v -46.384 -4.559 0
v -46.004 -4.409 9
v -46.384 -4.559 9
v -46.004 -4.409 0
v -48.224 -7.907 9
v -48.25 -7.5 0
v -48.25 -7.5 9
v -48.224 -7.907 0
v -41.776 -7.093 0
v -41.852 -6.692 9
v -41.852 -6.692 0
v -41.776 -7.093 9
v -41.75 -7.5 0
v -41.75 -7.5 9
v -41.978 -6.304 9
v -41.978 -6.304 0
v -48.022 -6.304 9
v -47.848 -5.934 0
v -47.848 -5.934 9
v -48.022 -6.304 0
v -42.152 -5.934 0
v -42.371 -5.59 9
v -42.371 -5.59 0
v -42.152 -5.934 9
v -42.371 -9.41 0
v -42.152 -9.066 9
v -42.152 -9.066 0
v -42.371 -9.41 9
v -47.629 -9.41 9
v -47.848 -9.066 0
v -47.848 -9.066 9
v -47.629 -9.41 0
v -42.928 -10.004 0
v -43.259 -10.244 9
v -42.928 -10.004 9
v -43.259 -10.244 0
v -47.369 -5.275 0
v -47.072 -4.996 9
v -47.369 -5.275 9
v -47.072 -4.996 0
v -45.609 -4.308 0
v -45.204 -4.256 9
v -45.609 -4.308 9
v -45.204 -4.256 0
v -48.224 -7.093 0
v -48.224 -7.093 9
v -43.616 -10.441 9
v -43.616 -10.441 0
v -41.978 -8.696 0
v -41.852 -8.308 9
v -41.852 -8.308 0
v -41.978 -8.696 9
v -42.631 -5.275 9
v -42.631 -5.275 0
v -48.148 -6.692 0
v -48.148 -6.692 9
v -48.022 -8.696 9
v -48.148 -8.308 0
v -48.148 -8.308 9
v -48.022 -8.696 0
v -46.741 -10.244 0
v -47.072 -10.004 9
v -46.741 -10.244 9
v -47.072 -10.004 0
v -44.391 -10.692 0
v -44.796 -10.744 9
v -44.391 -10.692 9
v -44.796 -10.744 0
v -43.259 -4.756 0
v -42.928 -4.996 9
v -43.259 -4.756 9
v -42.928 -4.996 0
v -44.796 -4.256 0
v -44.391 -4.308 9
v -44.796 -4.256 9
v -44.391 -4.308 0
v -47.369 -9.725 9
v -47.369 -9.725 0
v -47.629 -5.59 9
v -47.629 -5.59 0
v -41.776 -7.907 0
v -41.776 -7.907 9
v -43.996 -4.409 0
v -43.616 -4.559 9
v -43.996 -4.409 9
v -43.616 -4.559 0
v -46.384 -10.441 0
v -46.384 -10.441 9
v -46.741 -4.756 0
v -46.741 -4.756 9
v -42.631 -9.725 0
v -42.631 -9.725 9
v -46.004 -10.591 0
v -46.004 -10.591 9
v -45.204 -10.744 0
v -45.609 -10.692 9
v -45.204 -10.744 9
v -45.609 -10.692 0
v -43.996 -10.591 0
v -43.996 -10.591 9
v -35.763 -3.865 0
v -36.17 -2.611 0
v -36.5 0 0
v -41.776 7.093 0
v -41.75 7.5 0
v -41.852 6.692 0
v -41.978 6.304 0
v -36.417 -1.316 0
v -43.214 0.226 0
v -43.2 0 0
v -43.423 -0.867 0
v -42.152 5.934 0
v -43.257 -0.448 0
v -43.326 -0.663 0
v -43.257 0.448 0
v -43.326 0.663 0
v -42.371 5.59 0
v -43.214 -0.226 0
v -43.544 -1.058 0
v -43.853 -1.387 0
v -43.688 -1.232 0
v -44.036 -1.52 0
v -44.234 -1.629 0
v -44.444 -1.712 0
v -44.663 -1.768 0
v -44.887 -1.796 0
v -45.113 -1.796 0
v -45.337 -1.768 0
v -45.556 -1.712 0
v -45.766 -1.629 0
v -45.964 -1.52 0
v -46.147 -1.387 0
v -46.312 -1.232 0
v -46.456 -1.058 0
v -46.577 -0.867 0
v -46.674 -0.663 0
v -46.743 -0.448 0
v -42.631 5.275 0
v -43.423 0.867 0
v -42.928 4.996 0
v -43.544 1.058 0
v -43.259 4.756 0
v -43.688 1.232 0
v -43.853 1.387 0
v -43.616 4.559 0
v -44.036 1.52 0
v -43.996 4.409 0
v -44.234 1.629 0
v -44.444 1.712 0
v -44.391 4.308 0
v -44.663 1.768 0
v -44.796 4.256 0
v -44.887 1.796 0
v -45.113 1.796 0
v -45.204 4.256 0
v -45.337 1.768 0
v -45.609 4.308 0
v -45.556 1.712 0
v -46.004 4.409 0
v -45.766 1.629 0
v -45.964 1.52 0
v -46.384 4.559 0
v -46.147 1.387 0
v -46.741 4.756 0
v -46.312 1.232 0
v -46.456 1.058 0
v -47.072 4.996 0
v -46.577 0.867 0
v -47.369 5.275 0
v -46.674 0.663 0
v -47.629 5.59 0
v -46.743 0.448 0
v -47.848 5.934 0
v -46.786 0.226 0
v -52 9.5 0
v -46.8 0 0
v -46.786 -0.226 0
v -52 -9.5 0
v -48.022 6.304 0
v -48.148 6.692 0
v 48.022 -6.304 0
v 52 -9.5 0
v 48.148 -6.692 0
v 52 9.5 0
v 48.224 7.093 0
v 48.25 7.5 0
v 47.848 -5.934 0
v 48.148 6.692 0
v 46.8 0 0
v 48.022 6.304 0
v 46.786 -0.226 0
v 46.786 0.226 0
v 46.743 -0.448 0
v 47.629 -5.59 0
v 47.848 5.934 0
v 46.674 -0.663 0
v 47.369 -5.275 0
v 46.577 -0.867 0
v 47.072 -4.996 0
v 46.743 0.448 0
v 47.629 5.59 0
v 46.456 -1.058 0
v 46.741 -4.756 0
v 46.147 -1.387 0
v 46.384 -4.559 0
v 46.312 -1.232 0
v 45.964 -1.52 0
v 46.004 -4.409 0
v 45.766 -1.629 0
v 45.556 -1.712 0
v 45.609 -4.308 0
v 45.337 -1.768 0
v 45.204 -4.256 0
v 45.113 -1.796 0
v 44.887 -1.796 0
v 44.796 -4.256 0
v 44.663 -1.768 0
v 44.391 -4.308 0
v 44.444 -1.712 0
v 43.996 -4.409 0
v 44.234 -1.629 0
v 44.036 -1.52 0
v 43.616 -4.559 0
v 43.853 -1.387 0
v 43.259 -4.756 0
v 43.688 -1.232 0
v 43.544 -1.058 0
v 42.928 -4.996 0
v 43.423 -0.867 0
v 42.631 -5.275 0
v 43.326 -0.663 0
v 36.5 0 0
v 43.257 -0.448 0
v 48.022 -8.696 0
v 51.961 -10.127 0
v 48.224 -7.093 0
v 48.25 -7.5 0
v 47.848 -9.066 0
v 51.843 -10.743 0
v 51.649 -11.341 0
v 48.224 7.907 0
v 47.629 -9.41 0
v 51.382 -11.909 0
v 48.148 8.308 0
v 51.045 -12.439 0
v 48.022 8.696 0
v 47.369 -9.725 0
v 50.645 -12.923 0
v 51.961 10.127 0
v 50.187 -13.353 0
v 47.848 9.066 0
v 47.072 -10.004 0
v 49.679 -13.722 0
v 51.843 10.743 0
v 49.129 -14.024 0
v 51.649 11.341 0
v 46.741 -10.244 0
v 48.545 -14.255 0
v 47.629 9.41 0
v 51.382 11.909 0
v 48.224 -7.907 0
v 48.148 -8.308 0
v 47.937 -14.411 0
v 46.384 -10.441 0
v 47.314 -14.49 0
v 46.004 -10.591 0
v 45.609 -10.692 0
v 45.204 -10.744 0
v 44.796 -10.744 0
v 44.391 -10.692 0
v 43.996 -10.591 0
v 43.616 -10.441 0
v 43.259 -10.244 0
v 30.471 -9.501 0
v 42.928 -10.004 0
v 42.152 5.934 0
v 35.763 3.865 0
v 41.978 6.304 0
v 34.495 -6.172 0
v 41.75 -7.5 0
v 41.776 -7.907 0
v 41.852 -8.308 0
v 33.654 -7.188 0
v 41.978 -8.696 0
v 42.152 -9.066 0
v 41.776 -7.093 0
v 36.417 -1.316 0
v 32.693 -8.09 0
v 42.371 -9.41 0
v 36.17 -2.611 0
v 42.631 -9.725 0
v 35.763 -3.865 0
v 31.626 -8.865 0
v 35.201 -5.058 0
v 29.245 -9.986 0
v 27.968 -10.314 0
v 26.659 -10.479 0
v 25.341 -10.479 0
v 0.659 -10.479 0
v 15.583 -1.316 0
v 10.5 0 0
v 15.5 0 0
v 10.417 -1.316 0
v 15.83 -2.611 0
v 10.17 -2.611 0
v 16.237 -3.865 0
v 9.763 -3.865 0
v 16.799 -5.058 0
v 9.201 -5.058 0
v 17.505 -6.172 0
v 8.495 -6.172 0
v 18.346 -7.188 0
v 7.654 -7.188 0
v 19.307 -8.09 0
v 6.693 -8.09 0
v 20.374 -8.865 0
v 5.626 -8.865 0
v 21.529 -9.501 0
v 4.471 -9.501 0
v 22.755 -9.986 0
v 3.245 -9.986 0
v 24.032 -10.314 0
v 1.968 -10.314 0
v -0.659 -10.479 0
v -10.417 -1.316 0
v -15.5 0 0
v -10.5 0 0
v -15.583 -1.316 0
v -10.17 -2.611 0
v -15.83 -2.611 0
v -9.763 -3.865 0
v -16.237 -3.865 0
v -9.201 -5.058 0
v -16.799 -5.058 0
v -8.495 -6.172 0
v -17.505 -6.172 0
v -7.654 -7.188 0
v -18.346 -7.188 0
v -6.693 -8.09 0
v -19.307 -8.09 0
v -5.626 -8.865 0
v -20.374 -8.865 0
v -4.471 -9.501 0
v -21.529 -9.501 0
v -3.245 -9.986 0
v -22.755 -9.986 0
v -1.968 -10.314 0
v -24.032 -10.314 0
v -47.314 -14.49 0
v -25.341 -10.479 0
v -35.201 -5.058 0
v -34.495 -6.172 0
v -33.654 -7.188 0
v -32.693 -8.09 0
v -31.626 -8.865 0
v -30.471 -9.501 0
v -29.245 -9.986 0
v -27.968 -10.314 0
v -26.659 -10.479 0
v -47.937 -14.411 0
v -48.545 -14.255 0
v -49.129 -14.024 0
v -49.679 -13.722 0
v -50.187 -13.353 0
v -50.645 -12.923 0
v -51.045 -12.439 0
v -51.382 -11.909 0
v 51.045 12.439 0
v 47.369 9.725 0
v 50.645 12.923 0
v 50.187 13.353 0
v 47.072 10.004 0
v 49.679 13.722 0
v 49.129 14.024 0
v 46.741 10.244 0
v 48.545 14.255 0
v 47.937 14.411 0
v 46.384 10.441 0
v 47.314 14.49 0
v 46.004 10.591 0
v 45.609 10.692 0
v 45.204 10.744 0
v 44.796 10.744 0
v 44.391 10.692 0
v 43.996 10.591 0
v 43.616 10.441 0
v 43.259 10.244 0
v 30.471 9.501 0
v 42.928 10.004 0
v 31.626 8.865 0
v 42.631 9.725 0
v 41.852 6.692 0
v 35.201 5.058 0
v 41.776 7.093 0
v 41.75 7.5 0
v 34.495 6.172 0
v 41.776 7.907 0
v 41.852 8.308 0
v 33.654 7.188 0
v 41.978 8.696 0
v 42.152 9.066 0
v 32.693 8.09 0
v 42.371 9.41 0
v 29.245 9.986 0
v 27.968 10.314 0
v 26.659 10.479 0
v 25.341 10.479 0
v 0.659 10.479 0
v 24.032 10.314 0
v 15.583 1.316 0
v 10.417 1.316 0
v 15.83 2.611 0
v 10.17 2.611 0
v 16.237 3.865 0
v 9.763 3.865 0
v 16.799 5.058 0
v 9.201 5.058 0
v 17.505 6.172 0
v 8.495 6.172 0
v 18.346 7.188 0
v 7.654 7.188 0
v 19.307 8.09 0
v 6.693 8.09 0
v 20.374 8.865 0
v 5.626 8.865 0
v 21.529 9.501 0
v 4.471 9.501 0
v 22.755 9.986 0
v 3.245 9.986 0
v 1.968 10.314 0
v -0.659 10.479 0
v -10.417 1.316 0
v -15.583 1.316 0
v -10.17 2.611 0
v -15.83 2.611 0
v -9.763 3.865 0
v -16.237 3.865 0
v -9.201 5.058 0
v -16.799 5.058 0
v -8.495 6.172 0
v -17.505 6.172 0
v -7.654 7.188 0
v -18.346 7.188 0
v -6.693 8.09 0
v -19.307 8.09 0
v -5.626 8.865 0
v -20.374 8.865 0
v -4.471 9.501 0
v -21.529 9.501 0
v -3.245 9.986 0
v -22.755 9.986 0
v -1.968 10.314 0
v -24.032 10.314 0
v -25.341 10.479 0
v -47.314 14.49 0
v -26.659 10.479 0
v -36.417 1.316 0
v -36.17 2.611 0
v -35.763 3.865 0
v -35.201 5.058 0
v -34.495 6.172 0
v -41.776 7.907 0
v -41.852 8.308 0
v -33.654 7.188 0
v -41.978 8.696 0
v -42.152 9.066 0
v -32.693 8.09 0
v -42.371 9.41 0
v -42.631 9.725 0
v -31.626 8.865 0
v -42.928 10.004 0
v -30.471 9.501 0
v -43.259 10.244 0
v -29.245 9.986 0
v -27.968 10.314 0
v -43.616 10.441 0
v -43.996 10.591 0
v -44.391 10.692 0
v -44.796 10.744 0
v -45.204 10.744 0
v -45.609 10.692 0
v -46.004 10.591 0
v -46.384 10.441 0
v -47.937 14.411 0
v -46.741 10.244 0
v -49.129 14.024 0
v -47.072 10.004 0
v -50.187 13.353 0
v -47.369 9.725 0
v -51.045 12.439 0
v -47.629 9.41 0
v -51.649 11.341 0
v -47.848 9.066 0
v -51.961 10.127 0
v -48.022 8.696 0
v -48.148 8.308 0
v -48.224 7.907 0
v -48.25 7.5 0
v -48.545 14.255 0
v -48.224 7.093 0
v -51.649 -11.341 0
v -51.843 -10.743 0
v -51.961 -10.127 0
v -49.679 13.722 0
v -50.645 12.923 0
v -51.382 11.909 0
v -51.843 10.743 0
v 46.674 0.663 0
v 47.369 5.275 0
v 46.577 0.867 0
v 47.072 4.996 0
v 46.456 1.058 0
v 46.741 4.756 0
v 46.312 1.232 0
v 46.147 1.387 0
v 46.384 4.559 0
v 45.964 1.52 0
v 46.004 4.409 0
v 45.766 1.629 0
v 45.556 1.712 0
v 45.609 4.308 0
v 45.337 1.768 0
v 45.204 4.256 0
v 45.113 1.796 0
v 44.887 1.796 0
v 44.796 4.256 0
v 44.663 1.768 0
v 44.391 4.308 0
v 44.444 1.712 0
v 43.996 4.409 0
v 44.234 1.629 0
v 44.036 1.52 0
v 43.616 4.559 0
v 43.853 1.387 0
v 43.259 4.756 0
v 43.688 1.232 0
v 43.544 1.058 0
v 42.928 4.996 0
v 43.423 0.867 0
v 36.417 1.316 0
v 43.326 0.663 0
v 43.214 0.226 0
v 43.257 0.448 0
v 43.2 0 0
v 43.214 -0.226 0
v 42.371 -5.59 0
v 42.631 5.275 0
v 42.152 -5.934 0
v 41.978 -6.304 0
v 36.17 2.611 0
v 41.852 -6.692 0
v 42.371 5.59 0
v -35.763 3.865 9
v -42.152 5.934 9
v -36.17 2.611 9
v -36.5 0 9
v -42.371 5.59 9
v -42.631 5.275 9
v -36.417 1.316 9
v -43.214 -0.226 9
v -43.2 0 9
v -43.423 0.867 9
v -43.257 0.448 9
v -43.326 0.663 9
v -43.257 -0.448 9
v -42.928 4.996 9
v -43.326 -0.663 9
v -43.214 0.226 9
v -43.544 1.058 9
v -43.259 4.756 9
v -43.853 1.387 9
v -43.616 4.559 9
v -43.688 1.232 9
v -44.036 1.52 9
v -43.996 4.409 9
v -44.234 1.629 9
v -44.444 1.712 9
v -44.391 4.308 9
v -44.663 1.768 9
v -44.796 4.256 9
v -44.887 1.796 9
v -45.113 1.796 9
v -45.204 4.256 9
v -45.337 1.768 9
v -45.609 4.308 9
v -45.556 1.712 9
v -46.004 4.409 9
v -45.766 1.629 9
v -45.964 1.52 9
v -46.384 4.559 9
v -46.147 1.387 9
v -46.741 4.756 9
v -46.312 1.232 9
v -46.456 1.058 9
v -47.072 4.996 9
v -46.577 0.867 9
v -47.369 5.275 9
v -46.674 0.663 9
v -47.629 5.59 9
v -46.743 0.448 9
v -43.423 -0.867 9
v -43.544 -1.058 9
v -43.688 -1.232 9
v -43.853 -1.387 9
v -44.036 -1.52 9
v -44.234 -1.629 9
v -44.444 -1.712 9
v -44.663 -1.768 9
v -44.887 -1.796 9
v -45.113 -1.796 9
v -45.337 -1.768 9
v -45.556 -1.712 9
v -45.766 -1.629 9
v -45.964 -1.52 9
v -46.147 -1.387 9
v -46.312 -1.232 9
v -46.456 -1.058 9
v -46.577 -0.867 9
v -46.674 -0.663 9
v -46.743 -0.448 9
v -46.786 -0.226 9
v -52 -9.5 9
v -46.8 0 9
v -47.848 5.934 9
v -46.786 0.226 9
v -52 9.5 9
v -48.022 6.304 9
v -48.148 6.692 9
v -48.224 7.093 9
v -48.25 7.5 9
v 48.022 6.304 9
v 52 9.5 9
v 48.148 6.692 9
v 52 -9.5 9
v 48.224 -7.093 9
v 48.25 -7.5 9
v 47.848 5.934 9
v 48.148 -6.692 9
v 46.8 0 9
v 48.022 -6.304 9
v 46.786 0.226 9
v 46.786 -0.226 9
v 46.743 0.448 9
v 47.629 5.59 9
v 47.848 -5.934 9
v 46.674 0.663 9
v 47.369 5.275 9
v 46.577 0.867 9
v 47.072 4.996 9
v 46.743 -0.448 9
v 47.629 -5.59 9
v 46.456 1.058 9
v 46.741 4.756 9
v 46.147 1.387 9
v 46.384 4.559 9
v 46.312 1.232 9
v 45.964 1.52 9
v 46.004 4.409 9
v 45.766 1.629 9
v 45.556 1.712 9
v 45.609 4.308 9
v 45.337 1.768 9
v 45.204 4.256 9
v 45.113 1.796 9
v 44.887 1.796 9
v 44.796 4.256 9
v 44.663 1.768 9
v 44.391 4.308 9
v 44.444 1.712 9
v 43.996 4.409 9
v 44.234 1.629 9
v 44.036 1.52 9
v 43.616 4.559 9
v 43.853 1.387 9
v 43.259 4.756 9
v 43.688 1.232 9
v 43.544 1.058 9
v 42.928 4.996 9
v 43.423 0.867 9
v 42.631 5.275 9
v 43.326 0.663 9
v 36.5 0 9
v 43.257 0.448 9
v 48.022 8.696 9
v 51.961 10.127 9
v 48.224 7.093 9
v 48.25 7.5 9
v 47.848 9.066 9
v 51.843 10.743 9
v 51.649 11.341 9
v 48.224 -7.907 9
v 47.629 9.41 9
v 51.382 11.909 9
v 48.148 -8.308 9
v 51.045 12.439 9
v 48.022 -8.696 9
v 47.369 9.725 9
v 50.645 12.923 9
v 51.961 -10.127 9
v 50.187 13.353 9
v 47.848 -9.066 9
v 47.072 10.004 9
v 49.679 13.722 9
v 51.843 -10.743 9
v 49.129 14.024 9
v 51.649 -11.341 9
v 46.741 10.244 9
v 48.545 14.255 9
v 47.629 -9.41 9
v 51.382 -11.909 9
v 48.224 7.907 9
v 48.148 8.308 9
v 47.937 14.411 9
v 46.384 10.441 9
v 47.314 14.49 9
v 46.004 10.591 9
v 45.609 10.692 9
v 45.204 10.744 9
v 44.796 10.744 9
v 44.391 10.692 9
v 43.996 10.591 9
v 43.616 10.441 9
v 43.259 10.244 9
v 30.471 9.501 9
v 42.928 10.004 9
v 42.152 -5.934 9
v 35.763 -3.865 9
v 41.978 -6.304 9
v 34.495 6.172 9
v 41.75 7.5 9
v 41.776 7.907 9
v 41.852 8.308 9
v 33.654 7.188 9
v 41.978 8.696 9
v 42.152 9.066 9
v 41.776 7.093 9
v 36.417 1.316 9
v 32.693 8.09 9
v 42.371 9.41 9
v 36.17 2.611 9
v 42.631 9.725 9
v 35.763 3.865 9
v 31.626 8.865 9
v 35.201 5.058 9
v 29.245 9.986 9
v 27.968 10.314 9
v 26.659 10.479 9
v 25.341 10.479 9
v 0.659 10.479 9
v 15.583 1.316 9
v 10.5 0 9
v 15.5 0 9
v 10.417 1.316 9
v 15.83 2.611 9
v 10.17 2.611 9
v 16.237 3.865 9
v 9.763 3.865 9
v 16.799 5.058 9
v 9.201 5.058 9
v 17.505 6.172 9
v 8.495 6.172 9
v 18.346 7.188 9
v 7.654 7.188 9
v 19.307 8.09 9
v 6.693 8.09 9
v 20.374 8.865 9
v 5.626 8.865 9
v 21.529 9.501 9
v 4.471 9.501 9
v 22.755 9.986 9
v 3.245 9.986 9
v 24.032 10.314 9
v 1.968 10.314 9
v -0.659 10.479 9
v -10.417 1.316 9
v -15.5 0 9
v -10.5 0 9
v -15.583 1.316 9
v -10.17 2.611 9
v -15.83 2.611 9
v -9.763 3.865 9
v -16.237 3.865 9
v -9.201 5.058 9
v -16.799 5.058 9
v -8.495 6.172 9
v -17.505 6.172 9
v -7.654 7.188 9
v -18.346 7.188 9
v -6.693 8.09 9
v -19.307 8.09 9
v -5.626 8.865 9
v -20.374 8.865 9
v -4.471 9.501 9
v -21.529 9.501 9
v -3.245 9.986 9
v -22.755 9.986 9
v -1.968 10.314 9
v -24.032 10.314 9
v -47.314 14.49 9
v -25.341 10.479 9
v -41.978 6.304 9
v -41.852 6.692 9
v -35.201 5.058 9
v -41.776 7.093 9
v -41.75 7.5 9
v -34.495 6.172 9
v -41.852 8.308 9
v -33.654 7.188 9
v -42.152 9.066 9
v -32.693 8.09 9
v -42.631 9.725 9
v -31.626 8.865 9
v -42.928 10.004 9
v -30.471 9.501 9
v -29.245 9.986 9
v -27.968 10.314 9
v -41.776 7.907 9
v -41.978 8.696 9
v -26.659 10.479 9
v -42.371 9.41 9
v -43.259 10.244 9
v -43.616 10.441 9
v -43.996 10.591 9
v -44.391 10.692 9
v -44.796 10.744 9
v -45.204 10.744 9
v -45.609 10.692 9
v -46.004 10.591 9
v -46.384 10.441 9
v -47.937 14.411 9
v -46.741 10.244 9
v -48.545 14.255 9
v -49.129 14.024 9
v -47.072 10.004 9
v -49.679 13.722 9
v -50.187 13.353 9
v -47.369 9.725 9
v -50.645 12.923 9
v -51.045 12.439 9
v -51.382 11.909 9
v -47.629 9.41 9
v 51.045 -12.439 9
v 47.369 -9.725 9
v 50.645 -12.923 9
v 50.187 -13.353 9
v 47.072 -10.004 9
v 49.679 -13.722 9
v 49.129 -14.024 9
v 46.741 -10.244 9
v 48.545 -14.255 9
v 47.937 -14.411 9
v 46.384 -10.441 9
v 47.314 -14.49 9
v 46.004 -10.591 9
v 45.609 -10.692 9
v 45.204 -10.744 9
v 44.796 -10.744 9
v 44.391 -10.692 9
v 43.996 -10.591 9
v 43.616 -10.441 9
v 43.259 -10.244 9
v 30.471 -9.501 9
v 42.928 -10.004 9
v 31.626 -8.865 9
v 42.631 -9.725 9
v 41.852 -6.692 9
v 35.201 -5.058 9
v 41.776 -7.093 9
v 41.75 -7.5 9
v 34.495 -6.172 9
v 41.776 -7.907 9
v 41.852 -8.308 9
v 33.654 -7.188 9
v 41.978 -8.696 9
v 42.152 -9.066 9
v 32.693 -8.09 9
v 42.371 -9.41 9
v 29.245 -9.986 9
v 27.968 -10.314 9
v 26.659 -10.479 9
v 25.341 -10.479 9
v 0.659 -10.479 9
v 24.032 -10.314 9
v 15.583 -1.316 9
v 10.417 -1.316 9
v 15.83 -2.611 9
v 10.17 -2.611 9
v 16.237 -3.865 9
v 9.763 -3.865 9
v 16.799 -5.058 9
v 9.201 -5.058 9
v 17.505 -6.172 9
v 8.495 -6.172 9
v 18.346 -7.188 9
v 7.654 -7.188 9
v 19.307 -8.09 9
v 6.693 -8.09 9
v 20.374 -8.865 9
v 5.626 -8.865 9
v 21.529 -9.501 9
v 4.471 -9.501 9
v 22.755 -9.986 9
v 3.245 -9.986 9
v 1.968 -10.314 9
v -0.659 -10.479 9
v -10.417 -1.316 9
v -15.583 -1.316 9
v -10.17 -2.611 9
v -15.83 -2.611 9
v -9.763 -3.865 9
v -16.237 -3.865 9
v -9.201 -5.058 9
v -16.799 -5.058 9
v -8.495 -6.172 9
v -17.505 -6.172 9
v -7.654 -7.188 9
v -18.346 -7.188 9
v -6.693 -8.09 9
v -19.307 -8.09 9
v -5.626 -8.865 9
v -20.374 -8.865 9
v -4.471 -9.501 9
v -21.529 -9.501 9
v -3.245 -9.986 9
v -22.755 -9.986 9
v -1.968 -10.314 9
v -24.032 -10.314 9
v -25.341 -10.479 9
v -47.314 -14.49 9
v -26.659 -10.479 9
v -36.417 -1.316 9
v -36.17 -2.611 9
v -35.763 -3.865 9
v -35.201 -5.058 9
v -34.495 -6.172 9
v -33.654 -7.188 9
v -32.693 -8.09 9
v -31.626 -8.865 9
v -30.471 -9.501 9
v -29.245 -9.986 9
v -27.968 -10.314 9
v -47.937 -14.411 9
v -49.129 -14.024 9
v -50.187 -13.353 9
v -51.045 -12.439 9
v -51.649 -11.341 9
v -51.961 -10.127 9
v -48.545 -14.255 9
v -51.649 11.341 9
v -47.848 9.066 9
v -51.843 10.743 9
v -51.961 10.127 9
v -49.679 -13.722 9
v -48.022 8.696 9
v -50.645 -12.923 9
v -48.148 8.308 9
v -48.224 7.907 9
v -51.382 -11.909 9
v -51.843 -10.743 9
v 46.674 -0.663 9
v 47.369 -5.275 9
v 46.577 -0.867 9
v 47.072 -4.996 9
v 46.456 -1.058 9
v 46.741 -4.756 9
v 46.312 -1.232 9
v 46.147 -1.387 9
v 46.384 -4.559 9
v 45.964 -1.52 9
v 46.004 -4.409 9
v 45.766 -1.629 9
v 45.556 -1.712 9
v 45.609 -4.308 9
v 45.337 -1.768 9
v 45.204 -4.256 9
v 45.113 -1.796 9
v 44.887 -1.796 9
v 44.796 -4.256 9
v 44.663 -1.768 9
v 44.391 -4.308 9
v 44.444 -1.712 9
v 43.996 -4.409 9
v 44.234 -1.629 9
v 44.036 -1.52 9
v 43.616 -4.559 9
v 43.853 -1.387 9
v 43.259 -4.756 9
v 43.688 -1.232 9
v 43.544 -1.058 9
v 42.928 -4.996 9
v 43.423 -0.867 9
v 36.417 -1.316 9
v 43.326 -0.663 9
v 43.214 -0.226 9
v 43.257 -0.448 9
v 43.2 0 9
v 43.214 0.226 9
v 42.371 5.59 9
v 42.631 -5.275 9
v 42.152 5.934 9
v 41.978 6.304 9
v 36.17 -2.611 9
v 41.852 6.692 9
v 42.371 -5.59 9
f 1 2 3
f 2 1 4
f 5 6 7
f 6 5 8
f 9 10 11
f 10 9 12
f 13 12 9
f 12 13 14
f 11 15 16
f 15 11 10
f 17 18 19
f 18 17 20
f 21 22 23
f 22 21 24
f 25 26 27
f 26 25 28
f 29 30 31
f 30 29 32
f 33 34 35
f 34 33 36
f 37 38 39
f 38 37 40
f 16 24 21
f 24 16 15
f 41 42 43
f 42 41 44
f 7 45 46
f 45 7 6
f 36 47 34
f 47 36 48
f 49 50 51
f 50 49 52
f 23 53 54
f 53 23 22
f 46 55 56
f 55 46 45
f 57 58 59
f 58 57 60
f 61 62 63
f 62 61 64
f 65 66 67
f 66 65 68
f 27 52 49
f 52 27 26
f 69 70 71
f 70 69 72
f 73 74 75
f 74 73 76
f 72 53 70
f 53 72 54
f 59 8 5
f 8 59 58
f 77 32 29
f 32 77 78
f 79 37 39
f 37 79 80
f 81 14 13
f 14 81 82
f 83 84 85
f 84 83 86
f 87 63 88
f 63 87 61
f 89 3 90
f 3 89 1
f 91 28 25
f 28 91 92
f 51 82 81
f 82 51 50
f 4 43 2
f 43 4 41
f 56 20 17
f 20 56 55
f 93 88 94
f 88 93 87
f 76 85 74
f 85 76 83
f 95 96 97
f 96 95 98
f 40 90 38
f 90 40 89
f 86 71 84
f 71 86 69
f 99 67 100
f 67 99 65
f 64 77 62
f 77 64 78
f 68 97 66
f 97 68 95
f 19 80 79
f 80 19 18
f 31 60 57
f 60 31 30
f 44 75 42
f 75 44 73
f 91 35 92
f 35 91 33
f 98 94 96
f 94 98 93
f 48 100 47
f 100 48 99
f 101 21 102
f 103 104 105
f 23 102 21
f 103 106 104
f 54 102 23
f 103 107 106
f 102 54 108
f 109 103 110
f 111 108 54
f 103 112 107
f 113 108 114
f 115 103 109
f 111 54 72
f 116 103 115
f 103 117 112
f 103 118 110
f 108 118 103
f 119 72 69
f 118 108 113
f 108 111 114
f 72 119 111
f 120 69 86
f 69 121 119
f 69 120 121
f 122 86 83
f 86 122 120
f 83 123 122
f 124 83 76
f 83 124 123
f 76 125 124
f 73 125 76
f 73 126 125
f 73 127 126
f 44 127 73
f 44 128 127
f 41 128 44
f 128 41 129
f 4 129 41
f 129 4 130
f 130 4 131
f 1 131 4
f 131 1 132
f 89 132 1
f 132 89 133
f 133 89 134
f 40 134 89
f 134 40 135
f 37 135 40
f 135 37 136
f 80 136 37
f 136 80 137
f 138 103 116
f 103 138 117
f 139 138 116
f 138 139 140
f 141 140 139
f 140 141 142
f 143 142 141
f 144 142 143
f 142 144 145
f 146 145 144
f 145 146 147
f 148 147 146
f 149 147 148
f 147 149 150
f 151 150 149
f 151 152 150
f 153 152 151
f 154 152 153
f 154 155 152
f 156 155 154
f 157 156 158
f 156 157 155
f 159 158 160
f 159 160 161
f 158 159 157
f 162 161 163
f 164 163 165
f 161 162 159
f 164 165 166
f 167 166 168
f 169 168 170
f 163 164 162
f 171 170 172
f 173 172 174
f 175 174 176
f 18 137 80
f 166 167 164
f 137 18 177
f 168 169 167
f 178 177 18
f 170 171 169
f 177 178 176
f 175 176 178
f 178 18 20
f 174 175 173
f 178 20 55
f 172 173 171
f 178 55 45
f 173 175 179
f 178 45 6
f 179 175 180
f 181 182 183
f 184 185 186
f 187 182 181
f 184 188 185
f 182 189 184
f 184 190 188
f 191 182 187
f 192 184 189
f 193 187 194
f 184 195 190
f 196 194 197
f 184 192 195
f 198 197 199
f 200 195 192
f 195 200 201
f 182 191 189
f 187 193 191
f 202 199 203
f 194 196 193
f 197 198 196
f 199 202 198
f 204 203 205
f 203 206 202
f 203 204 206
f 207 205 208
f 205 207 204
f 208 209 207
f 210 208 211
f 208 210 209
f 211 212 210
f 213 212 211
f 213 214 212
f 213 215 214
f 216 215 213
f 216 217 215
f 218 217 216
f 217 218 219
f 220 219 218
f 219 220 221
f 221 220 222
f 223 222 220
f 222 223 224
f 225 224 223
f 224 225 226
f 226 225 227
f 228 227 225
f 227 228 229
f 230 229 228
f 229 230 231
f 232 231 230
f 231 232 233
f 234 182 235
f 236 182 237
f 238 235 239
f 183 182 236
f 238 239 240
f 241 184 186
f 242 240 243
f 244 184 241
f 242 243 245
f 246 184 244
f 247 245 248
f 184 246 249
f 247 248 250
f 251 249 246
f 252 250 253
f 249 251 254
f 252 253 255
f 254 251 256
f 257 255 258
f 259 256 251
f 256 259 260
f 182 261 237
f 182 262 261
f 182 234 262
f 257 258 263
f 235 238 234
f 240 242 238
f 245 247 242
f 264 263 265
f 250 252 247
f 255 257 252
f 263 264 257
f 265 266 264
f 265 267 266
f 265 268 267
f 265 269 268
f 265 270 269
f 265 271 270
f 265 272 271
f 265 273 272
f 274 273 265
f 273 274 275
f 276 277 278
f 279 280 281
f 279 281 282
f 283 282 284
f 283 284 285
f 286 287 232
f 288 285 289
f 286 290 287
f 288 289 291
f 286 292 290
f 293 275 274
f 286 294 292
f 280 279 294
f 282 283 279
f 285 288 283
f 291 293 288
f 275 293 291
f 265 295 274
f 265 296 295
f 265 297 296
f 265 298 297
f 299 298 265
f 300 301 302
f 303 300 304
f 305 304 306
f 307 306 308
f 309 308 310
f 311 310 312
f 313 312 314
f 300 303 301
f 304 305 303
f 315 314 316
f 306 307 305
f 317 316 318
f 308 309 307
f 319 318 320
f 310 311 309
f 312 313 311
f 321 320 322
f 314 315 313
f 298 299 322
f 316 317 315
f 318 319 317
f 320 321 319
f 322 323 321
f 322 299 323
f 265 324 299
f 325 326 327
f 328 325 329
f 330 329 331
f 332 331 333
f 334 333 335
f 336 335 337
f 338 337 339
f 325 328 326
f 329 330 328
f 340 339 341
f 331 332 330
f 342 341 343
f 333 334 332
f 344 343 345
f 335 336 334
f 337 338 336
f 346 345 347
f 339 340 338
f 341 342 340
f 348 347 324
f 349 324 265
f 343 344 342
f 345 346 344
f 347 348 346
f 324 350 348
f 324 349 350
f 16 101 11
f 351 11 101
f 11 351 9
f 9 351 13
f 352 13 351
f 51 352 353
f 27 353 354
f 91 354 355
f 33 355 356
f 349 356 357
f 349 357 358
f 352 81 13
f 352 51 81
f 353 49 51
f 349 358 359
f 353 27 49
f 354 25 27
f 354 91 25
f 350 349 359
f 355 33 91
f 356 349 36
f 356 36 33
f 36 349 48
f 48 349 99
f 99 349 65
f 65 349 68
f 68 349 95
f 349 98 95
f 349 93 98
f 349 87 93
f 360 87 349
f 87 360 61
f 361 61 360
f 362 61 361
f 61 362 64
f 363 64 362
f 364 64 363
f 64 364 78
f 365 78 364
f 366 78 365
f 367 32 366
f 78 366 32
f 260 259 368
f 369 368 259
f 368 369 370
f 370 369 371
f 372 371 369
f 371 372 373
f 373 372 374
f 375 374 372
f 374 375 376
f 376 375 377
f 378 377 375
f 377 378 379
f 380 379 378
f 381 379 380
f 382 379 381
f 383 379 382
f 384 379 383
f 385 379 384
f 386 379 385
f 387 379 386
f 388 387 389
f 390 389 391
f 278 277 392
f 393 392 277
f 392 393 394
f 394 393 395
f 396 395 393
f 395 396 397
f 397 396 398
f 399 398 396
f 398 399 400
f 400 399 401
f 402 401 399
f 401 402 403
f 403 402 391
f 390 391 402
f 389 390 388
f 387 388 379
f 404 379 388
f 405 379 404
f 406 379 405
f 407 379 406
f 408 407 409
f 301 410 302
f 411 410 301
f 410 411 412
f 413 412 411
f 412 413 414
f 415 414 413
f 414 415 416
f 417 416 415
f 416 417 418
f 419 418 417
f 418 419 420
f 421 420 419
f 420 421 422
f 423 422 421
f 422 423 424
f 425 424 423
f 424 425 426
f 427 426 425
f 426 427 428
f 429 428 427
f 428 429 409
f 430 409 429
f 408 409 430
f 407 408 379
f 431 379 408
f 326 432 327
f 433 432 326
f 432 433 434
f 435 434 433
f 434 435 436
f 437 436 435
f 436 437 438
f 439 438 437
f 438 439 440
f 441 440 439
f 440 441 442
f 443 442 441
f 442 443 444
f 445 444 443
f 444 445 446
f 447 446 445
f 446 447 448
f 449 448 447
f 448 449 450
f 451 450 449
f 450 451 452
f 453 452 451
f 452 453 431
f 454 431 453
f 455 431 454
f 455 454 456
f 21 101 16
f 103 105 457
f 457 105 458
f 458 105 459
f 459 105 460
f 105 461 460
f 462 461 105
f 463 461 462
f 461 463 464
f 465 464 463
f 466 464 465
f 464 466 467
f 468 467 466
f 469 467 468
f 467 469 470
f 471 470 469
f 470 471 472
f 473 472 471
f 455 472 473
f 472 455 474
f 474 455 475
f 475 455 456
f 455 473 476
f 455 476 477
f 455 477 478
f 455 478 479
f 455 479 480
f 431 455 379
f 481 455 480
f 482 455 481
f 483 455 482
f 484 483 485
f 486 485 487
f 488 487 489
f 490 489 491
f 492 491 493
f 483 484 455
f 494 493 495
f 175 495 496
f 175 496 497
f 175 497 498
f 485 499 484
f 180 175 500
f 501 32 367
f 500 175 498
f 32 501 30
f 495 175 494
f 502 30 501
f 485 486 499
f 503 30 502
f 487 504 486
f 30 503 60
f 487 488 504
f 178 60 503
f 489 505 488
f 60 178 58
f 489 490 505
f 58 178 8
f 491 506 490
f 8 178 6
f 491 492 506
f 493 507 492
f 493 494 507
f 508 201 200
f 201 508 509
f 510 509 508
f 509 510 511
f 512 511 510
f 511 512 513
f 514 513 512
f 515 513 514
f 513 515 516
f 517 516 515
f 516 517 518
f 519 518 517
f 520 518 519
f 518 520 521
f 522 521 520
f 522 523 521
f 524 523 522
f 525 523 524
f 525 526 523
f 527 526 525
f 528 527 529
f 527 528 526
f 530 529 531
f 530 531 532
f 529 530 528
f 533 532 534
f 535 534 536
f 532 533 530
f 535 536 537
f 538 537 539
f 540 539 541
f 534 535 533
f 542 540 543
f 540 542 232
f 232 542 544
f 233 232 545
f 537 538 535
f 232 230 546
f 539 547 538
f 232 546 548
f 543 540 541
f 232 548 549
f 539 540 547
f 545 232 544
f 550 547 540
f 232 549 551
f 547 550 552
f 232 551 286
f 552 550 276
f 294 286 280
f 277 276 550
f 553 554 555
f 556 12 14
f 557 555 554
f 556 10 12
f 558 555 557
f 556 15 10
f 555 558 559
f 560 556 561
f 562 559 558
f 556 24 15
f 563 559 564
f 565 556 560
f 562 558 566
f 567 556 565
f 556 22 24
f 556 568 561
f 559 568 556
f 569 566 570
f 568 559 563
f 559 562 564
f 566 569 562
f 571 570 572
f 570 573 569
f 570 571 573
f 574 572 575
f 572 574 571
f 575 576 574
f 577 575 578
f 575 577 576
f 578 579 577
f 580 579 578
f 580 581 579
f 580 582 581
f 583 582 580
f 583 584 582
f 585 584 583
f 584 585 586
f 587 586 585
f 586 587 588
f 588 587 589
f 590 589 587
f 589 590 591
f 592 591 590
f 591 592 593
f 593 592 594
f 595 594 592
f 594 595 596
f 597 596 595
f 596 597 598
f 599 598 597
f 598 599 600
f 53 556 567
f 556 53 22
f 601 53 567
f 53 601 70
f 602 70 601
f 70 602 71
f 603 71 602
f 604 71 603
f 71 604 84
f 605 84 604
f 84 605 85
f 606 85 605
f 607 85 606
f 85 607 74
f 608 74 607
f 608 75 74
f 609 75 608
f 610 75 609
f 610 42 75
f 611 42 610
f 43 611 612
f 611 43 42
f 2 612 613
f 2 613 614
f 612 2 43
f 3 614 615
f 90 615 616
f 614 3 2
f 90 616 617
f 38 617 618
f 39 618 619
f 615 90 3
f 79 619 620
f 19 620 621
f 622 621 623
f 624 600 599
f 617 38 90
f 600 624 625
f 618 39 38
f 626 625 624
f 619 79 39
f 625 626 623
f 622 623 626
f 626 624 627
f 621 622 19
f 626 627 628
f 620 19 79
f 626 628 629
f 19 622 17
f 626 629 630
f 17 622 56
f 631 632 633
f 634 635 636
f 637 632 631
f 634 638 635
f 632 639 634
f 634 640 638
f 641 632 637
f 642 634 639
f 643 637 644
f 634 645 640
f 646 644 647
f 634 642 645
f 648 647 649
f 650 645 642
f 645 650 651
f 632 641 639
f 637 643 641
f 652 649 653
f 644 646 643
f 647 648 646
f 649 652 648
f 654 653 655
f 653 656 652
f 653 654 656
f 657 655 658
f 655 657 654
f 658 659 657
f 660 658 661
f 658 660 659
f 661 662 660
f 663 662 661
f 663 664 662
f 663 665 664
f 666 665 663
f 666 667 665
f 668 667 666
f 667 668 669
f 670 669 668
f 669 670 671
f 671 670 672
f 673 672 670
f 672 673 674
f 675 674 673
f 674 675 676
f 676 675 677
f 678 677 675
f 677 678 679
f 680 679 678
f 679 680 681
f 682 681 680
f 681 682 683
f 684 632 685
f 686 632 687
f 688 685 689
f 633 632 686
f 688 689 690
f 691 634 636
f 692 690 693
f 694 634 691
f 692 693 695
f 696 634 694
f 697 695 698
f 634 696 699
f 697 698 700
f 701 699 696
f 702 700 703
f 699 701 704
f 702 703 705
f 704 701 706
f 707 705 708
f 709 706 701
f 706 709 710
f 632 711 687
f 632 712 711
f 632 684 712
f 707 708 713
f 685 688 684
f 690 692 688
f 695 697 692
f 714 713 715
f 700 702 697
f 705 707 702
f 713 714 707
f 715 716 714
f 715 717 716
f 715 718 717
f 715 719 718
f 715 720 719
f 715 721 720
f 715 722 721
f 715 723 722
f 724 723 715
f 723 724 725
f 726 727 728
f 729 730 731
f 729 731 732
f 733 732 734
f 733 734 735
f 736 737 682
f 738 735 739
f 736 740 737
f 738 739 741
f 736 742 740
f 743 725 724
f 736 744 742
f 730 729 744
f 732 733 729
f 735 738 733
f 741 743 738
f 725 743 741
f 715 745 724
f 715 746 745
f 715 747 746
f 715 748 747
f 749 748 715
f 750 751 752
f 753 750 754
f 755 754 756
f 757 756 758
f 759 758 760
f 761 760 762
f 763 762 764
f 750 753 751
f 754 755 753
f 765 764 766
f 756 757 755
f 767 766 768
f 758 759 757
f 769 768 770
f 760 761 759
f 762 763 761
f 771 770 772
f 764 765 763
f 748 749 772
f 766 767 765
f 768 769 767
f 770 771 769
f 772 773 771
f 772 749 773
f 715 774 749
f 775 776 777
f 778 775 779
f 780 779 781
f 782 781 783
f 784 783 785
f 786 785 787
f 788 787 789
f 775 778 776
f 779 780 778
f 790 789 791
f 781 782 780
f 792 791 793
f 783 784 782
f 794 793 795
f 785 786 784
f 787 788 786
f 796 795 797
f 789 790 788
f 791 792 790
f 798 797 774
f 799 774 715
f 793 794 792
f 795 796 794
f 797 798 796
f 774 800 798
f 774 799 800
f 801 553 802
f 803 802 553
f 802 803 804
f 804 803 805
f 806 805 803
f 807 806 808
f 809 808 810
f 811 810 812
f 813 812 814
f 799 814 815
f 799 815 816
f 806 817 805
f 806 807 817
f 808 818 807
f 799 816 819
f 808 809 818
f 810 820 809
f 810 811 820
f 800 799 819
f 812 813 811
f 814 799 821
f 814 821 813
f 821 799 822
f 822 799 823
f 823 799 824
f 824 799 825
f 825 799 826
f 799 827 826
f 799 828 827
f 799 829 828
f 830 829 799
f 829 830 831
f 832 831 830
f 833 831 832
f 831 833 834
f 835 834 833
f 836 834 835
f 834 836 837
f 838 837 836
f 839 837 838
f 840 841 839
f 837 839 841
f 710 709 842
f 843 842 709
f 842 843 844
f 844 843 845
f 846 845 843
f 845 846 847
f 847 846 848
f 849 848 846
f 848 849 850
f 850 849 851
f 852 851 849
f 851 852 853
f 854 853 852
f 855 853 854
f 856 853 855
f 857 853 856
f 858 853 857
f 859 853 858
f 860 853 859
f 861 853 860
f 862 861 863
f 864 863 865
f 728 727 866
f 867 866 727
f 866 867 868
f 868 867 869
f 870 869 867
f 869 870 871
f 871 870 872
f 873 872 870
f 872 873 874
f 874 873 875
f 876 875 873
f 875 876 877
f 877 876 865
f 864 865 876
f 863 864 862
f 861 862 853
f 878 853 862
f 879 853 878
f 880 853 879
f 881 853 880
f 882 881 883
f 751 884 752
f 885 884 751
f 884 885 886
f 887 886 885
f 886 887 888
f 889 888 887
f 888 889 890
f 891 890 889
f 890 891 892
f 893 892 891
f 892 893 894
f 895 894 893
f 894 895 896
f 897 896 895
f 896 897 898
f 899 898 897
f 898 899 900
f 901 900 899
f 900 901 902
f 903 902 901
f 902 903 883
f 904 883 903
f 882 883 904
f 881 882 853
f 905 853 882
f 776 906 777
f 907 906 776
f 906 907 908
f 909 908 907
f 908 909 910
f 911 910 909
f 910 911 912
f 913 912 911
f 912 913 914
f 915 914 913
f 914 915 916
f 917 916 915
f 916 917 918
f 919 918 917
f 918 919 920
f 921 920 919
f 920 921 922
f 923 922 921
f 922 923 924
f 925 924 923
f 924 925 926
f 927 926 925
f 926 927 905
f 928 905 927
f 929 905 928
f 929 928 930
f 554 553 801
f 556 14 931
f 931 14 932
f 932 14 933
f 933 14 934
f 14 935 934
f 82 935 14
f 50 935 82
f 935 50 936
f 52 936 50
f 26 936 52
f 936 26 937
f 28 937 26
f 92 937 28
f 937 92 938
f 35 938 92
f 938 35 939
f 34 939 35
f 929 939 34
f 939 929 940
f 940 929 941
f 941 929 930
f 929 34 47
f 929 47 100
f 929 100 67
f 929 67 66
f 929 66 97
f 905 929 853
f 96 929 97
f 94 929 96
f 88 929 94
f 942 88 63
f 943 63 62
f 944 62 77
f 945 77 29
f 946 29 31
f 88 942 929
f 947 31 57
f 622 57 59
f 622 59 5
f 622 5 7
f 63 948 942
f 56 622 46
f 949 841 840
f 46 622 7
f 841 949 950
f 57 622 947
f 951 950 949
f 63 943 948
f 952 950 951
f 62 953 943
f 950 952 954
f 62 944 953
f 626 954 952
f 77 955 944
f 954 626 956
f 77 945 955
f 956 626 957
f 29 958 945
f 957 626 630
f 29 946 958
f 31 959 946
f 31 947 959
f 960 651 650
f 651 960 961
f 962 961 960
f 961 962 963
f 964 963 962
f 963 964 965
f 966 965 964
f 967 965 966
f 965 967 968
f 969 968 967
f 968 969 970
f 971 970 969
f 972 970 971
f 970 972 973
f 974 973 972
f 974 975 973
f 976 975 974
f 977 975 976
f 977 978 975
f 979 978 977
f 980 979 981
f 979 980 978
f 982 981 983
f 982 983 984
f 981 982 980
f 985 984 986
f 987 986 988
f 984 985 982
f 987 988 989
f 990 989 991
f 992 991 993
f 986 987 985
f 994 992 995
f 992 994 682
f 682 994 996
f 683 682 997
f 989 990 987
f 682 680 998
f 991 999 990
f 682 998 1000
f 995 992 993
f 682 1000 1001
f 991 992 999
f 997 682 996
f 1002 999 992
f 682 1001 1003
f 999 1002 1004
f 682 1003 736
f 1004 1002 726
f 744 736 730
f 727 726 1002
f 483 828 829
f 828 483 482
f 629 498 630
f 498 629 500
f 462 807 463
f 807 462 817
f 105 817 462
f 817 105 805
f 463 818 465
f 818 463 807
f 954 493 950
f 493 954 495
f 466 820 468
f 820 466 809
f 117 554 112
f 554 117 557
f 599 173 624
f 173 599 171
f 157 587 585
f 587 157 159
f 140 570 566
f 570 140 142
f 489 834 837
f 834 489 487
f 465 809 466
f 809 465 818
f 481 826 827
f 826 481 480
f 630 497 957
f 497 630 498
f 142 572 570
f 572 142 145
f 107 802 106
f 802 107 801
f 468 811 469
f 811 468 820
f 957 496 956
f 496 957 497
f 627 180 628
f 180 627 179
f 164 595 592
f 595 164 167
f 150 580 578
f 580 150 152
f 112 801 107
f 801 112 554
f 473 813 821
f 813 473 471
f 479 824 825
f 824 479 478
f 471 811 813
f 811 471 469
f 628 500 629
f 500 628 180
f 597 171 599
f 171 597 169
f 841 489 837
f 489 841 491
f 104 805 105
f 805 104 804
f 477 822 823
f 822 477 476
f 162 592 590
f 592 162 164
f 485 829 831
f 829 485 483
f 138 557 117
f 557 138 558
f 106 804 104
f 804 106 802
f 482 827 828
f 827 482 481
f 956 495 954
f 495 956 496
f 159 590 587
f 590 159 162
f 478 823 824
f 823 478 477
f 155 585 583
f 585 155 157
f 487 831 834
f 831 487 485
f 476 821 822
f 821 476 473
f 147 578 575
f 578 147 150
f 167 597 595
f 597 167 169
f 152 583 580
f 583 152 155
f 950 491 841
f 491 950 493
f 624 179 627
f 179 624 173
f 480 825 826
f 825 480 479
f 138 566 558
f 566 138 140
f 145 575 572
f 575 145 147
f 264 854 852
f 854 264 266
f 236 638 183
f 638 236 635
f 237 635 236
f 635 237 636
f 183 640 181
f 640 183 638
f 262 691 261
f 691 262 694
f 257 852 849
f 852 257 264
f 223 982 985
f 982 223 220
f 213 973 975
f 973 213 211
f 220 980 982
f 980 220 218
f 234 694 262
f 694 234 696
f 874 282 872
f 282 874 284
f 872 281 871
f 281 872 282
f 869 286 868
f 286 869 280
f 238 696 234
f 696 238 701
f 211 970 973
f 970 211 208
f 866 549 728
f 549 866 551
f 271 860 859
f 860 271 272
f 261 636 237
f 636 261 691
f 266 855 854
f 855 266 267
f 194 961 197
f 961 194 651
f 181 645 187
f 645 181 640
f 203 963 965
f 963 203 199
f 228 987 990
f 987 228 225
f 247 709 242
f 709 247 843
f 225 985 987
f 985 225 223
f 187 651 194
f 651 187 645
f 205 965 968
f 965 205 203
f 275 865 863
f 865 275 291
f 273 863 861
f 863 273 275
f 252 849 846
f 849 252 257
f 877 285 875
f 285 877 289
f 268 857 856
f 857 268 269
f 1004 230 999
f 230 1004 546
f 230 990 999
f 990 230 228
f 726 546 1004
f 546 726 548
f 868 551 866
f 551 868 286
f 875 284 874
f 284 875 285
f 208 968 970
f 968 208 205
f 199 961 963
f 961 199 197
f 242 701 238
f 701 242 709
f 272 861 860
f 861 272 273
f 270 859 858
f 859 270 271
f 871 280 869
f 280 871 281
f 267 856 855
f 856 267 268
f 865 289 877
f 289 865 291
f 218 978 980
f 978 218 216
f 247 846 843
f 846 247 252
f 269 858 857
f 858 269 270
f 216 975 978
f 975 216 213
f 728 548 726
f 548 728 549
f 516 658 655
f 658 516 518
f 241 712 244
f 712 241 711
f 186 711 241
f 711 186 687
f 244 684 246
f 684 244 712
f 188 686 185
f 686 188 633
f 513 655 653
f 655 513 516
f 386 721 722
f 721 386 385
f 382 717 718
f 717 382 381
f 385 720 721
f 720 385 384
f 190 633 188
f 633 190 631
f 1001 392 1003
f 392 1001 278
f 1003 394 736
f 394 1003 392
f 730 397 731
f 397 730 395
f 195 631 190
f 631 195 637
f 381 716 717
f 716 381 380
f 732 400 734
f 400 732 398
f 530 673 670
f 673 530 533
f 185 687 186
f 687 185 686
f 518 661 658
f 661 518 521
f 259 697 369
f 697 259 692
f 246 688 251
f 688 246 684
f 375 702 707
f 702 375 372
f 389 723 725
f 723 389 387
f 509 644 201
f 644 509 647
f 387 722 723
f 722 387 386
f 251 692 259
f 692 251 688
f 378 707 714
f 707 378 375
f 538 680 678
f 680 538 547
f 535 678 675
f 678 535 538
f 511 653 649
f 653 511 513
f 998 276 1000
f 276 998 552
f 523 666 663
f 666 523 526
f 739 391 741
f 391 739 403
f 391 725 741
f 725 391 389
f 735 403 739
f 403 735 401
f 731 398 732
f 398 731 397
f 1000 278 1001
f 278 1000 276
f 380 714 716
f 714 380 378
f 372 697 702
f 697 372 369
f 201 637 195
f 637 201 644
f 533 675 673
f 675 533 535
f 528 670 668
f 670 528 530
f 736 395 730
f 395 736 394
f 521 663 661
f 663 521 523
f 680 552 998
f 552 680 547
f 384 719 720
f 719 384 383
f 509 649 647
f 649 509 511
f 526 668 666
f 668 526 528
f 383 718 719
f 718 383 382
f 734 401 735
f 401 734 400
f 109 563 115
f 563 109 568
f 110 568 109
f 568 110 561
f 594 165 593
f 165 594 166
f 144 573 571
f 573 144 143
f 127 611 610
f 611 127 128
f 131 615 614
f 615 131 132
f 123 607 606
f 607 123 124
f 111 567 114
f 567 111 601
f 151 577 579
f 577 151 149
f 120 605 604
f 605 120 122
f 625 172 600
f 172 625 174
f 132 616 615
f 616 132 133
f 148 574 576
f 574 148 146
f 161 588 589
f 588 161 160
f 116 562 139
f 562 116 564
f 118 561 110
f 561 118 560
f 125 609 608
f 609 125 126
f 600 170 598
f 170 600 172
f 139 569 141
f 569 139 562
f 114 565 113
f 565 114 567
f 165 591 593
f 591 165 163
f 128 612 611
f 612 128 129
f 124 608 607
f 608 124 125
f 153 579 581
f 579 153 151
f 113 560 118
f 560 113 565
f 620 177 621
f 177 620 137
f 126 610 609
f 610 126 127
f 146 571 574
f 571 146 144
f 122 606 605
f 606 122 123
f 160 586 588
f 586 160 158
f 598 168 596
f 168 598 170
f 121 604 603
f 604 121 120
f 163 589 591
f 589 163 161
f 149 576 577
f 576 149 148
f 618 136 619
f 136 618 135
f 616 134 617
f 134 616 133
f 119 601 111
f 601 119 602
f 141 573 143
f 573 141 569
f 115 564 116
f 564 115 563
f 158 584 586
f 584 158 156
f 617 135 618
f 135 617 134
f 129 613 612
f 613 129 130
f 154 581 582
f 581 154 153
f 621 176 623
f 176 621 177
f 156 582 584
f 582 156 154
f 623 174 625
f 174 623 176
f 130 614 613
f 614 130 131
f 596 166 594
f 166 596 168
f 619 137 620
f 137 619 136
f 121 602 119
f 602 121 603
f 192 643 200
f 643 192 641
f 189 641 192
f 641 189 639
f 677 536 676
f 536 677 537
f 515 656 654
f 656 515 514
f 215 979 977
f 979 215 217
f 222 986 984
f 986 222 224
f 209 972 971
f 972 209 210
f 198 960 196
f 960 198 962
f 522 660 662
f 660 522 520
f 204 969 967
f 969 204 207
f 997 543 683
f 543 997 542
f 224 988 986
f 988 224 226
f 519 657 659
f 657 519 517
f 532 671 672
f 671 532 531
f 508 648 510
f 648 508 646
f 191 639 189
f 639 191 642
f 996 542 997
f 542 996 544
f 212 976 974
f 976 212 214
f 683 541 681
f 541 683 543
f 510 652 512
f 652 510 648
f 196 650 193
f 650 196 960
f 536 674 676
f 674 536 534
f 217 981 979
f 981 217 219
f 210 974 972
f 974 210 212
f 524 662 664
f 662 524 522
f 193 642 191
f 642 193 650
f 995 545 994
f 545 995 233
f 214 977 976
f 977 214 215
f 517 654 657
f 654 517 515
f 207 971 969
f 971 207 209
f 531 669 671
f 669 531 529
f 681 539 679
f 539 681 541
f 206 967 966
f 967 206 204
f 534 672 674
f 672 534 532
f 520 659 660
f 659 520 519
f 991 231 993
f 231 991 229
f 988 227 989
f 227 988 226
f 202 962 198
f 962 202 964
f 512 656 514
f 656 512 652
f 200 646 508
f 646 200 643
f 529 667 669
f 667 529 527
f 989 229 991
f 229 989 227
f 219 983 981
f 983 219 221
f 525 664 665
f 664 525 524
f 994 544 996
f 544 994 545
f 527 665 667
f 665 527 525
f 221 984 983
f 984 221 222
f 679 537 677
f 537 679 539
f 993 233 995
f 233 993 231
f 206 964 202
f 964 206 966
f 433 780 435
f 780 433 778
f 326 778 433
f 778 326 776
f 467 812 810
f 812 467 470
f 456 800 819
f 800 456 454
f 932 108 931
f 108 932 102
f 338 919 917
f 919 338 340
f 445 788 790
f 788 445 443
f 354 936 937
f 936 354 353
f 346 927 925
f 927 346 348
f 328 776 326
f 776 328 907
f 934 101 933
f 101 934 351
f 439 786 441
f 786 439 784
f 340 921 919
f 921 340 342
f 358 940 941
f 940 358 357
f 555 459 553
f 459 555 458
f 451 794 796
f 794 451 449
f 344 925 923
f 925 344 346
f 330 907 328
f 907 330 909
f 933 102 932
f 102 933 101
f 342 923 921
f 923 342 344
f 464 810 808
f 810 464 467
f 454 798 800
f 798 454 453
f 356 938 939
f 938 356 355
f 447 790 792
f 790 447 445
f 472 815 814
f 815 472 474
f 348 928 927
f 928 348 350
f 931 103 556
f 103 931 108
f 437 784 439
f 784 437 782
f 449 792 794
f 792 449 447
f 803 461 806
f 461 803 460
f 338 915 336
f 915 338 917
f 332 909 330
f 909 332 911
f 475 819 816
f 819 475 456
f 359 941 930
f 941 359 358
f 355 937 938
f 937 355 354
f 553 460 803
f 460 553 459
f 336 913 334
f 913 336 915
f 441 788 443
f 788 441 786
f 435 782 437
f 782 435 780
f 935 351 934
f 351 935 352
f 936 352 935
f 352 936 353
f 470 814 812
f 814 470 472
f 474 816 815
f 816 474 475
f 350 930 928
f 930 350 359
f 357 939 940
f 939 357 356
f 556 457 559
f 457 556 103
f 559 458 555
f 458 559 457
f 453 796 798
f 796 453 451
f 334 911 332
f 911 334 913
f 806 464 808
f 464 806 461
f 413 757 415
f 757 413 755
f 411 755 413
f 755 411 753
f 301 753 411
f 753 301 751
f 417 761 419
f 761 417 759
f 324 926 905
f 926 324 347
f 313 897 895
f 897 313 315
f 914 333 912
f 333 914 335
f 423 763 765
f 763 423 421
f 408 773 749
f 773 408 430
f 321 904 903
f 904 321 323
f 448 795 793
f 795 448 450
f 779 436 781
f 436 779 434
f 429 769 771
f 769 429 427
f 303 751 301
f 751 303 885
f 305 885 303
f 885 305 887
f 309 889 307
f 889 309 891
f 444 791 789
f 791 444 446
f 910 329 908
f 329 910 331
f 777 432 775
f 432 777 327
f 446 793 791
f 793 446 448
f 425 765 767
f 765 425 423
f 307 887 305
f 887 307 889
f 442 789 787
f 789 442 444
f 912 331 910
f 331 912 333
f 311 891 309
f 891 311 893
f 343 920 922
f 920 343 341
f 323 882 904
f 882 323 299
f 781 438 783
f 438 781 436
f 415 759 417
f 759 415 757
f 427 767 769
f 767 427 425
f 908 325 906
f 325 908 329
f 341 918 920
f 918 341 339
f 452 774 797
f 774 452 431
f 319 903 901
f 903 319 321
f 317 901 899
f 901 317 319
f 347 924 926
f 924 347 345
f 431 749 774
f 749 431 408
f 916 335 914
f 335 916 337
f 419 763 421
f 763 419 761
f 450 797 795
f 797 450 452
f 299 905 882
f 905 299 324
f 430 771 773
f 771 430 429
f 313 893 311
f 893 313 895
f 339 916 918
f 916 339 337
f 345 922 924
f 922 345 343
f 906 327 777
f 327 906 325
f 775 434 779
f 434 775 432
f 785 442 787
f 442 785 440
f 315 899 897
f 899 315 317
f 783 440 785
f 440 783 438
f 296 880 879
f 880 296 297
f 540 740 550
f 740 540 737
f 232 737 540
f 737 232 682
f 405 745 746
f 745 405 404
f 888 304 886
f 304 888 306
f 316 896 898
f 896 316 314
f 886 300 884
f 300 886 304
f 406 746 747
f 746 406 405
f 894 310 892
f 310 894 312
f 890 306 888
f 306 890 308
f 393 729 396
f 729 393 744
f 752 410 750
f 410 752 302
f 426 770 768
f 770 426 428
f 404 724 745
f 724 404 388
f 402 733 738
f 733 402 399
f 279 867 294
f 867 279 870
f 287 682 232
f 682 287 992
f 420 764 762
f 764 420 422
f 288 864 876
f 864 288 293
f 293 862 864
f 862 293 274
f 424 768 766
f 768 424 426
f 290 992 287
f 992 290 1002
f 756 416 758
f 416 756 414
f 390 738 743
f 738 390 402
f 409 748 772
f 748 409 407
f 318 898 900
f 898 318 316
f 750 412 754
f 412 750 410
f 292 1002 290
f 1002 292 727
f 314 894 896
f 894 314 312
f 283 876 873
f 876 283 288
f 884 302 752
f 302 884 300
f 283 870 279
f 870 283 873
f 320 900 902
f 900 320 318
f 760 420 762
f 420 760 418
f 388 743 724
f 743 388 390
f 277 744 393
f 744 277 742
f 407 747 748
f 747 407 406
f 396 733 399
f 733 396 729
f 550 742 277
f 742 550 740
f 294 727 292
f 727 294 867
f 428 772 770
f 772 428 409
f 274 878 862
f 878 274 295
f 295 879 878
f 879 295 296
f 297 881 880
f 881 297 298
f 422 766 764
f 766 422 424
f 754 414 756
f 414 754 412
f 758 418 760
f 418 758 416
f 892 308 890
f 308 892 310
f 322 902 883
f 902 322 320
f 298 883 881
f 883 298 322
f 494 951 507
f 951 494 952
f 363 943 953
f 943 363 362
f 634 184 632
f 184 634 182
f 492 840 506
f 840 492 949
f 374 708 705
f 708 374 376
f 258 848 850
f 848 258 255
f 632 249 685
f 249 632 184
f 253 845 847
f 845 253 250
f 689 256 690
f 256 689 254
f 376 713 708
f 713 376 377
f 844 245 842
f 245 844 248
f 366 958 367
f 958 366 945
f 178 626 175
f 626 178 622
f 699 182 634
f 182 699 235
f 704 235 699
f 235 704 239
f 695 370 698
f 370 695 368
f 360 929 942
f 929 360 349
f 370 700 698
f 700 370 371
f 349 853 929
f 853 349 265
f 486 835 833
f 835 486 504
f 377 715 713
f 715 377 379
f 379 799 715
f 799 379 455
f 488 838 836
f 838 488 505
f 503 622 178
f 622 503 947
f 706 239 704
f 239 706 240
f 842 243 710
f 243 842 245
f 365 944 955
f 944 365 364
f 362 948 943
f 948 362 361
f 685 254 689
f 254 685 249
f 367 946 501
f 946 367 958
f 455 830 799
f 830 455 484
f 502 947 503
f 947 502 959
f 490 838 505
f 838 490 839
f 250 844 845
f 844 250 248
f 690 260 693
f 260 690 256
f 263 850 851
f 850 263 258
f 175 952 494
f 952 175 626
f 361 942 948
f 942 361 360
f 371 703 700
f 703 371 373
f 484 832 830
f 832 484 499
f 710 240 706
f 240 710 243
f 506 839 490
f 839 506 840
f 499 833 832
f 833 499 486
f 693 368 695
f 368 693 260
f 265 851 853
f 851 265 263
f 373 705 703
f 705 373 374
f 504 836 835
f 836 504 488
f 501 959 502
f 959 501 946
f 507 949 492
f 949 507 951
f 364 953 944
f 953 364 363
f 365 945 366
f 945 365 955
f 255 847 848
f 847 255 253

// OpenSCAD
$fn = 50;

difference() {
	union() {
		hull() {
			translate(v = [-47.0, 9.5, 0]) {
				cylinder(h = 9, r = 5);
			}
			translate(v = [47.0, 9.5, 0]) {
				cylinder(h = 9, r = 5);
			}
			translate(v = [-47.0, -9.5, 0]) {
				cylinder(h = 9, r = 5);
			}
			translate(v = [47.0, -9.5, 0]) {
				cylinder(h = 9, r = 5);
			}
		}
	}
	union() {
		translate(v = [-45.0, -7.5, 0]) {
			cylinder(h = 9, r = 3.25);
		}
		translate(v = [-45.0, 7.5, 0]) {
			cylinder(h = 9, r = 3.25);
		}
		translate(v = [45.0, -7.5, 0]) {
			cylinder(h = 9, r = 3.25);
		}
		translate(v = [45.0, 7.5, 0]) {
			cylinder(h = 9, r = 3.25);
		}
		translate(v = [-45.0, 0.0, 0]) {
			cylinder(h = 9, r = 1.8);
		}
		translate(v = [45.0, 0.0, 0]) {
			cylinder(h = 9, r = 1.8);
		}
		translate(v = [-26.0, 0, 0.0]) {
			cylinder(h = 9, r = 10.5);
		}
		cylinder(h = 9, r = 10.5);
		translate(v = [26.0, 0, 0.0]) {
			cylinder(h = 9, r = 10.5);
		}
	}
}
